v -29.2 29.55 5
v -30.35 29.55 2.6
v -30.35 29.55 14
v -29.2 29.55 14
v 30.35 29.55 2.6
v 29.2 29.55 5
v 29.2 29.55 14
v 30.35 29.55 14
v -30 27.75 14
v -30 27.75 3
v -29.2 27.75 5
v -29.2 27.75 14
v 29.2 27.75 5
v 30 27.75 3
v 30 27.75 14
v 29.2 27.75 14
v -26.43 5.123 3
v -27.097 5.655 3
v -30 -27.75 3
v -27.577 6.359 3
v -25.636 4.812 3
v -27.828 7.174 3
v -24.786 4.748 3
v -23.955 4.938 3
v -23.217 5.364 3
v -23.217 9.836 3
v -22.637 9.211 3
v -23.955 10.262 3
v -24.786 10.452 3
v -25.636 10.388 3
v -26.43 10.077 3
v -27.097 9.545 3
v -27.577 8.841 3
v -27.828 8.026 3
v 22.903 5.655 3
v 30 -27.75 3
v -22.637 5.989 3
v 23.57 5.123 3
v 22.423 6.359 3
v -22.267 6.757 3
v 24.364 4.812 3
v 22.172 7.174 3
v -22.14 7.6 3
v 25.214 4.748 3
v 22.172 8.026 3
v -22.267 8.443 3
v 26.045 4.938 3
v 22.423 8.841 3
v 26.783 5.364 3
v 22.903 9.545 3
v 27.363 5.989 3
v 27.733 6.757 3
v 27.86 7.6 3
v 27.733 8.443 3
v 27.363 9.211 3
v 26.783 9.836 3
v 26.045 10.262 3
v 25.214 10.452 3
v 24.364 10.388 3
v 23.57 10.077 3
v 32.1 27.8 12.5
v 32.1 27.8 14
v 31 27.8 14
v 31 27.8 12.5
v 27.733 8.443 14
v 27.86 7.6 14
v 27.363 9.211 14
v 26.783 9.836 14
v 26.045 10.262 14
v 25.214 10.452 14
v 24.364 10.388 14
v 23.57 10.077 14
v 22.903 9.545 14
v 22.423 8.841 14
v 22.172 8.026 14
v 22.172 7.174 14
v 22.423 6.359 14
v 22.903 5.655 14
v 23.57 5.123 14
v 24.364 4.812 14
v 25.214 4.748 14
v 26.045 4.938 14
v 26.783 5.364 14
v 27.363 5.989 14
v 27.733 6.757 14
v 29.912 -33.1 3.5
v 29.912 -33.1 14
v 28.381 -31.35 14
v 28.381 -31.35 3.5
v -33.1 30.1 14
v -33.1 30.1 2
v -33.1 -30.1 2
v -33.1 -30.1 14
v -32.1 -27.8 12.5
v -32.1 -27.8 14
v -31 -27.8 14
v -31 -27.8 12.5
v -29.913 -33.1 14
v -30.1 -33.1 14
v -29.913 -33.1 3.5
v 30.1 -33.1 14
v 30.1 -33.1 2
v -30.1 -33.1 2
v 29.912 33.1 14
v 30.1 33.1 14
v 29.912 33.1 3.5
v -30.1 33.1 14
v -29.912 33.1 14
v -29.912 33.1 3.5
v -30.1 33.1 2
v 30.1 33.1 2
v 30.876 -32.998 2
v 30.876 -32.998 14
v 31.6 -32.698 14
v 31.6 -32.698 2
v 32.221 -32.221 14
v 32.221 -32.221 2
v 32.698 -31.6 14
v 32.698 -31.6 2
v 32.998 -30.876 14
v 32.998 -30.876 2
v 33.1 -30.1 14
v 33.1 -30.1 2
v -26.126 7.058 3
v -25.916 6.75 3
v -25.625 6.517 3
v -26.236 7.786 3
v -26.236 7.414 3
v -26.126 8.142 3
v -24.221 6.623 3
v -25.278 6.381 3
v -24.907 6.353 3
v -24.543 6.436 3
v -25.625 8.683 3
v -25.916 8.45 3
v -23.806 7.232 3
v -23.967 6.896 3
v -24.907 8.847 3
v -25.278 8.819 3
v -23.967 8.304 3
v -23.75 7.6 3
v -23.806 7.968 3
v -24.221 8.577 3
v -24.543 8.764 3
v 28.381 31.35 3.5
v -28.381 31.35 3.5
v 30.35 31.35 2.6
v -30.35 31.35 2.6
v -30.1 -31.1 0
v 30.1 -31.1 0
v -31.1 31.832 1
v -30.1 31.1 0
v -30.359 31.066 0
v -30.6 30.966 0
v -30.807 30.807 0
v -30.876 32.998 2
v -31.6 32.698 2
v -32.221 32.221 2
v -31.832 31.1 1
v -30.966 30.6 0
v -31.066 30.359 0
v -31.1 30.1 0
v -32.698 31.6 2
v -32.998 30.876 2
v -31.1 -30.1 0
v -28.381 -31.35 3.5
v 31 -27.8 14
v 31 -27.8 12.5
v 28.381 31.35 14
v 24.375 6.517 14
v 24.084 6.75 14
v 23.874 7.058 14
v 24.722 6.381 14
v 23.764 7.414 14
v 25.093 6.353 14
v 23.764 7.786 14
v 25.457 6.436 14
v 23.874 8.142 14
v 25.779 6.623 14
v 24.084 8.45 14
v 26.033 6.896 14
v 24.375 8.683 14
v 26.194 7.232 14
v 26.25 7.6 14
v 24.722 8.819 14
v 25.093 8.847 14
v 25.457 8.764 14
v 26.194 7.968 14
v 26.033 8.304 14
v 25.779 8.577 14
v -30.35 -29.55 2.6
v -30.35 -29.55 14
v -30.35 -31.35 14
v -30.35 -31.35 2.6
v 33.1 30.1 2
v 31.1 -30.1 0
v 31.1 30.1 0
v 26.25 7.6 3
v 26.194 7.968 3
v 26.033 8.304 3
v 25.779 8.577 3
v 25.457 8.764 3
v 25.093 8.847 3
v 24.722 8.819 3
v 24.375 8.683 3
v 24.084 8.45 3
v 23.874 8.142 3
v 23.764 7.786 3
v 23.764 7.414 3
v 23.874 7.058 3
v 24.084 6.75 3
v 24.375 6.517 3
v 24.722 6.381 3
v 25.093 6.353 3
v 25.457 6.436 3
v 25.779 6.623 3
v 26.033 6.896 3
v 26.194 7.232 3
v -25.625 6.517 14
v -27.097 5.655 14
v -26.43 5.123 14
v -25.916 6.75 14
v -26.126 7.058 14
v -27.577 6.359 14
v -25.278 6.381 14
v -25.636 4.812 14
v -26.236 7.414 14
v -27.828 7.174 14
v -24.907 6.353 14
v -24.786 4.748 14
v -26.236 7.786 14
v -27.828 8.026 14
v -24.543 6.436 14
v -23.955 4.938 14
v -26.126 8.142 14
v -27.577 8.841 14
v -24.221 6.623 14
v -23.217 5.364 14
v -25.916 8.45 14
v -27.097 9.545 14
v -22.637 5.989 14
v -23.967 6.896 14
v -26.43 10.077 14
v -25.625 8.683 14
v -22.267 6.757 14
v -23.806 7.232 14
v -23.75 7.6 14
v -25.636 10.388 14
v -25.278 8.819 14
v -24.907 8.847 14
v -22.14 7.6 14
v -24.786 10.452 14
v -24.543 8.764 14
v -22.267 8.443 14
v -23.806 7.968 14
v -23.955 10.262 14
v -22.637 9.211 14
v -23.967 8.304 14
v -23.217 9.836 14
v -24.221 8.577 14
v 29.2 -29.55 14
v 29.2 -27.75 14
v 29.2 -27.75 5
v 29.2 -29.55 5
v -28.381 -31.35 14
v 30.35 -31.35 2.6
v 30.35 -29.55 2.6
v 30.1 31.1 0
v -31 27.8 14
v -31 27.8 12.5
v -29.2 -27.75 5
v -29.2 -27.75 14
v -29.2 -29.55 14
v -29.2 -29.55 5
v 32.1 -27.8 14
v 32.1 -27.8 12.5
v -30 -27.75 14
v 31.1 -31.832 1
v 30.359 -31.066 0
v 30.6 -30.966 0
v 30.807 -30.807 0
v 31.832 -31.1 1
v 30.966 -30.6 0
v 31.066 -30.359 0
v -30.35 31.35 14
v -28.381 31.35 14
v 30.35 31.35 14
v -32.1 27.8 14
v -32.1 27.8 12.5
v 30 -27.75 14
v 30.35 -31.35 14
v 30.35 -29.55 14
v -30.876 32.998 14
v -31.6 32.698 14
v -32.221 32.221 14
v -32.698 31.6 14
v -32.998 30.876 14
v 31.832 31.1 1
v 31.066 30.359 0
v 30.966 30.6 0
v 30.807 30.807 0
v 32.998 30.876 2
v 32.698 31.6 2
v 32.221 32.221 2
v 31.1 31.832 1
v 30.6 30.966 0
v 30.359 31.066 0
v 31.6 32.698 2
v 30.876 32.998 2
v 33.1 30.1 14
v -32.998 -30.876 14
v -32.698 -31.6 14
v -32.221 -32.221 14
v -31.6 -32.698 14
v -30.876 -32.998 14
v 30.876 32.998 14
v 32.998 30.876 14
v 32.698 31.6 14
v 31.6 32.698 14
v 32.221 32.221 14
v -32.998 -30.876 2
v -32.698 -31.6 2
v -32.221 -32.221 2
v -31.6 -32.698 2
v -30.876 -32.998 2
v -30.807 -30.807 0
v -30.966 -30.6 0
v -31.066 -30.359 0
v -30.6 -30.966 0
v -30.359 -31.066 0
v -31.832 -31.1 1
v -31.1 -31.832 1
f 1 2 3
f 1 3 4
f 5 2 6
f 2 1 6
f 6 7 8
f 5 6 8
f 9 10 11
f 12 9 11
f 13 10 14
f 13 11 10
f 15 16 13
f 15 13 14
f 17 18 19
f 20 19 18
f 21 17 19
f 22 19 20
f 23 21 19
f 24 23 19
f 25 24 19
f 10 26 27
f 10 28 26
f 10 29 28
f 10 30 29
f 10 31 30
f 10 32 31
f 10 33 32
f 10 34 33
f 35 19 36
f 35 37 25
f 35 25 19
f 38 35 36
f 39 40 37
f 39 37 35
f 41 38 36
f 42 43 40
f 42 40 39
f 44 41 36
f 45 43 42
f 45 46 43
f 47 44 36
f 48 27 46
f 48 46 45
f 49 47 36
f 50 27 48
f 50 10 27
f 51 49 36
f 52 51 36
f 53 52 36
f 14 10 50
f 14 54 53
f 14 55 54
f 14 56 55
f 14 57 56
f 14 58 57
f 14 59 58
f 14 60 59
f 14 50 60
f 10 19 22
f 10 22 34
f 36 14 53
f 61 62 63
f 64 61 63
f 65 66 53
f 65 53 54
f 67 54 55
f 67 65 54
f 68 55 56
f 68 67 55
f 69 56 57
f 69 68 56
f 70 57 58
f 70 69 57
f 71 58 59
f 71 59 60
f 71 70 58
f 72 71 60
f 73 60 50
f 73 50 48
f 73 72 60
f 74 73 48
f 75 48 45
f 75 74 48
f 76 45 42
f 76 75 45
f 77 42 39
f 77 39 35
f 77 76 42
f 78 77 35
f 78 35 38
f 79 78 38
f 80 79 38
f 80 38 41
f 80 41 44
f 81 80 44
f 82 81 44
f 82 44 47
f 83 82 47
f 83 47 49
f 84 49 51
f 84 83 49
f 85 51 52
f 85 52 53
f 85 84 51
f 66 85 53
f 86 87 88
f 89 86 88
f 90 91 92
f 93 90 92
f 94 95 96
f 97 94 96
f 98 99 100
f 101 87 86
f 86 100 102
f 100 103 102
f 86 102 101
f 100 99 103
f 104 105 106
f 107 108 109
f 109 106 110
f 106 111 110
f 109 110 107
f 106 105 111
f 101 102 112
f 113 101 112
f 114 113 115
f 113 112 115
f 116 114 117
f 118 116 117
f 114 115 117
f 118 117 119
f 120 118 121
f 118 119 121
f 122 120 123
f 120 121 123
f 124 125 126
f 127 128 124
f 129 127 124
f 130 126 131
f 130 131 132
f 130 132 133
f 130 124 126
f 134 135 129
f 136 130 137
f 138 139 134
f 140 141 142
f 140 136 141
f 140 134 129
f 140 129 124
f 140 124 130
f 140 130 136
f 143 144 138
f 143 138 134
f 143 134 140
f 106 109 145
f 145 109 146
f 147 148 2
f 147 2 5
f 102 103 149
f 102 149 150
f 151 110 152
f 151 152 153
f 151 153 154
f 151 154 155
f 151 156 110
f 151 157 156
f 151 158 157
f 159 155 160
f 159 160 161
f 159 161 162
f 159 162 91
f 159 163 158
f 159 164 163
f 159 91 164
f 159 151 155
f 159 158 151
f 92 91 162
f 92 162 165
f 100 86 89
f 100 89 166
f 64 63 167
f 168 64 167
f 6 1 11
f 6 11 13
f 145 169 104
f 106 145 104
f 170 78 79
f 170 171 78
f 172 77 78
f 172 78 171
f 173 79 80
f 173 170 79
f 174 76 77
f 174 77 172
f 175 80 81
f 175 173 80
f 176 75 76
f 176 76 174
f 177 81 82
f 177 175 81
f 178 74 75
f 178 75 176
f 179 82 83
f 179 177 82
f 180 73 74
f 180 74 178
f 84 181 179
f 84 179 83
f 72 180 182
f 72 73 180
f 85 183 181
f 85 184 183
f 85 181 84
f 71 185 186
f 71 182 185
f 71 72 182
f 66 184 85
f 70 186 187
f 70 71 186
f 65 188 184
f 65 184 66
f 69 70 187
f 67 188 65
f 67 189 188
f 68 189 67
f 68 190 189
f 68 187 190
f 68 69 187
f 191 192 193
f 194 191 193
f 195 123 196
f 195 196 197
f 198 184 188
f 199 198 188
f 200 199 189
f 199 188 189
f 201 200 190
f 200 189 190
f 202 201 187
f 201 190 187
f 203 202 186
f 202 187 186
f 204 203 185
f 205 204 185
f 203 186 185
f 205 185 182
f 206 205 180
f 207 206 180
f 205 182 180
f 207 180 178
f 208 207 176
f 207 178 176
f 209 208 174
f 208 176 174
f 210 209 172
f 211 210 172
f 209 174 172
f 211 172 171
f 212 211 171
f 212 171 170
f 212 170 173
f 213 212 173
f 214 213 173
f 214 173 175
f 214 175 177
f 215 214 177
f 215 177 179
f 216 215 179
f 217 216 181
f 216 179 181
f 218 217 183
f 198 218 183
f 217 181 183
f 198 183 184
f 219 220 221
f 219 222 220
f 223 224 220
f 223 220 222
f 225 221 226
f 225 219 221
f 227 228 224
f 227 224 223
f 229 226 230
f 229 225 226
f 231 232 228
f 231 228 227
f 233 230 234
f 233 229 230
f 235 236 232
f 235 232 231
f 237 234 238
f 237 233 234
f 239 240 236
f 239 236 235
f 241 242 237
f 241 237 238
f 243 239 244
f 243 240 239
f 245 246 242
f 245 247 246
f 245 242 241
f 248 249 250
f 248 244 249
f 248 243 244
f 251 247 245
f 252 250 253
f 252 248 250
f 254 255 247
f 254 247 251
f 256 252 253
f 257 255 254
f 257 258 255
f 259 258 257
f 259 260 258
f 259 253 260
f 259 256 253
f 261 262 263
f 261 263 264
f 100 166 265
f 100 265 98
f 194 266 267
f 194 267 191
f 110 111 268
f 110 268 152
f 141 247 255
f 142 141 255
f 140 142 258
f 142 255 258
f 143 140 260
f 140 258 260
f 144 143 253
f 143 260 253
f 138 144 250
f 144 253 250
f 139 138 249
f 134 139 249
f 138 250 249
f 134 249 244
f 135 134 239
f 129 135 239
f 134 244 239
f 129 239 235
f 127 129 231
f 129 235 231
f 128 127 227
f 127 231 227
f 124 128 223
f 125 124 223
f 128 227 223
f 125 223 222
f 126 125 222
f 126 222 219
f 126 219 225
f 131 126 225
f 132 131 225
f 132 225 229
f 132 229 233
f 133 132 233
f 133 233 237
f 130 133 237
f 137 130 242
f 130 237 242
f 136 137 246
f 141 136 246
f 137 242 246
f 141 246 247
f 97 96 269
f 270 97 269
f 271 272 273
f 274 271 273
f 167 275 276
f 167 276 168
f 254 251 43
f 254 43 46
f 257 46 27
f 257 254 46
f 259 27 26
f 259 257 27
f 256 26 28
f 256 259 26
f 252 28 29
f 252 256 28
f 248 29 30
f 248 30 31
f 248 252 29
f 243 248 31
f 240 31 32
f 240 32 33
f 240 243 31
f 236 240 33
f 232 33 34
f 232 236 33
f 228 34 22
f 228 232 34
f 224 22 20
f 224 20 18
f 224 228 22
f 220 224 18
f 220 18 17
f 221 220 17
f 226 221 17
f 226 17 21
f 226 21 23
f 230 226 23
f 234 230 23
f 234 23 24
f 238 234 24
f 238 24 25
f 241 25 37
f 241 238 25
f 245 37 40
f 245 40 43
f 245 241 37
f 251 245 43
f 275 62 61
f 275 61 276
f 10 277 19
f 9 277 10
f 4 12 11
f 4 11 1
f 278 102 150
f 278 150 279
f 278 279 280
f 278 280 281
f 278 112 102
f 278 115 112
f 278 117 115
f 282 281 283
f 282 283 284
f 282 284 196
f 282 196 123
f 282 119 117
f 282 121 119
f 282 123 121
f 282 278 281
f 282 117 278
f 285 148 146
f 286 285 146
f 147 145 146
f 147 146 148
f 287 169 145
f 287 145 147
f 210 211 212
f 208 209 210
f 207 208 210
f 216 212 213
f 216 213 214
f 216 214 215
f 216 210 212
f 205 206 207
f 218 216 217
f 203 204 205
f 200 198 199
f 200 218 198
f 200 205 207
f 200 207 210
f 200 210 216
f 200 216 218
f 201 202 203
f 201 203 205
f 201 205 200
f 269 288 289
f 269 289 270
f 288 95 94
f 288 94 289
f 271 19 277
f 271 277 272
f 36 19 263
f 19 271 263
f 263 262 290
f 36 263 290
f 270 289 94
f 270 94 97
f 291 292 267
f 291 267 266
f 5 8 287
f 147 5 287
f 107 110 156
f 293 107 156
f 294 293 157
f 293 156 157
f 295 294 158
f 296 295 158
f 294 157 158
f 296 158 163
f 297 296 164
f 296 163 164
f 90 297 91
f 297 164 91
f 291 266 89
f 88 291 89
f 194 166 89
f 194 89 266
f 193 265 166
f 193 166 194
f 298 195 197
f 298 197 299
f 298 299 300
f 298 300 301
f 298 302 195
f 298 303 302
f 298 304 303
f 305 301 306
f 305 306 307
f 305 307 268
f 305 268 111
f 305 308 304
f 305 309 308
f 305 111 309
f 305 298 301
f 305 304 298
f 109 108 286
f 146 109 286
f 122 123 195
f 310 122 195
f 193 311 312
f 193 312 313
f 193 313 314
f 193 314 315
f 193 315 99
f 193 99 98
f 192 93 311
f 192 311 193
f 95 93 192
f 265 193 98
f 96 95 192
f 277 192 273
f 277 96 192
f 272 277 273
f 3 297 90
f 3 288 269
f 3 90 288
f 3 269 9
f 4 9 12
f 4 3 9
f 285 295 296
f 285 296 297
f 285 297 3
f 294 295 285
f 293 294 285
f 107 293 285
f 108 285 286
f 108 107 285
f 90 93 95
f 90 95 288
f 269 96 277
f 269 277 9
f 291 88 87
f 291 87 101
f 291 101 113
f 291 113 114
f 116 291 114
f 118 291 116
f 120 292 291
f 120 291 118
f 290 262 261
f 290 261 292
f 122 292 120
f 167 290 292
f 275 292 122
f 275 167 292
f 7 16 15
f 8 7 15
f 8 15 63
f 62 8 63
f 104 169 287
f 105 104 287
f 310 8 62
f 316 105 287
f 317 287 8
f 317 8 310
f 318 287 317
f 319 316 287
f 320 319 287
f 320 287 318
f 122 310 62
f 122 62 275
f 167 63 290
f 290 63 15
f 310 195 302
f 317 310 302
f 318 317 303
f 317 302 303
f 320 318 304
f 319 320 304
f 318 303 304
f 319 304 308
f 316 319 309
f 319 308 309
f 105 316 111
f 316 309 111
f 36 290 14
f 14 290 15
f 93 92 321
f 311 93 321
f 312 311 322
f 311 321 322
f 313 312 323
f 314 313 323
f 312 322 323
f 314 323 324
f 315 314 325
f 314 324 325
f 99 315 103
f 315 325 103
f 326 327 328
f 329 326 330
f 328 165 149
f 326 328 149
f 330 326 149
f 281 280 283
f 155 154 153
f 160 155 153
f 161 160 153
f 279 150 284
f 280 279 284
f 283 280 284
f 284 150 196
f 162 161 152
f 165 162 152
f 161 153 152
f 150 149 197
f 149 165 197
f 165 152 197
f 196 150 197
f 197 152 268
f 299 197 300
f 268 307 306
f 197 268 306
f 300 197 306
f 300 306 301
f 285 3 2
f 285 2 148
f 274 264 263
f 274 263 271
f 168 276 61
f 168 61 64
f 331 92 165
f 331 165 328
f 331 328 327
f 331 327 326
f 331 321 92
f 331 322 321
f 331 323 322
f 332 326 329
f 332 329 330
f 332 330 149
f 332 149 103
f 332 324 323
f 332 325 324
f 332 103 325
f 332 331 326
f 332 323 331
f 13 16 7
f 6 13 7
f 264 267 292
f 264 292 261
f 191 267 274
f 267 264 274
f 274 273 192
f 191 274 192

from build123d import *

# Parameters (mm, degrees)
PAD_DEPTH             = 14
SKETCH001_W           = 60
SKETCH001_H           = 55.5
POCKET_DEPTH          = 11
SKETCH002_W           = 60.7
SKETCH002_H           = 1.8
POCKET001_DEPTH       = 11.4
POLARPATTERN_COUNT    = 2
SKETCH003_W           = 58.4
SKETCH003_H           = 2
POCKET002_DEPTH       = 9
POLARPATTERN001_COUNT = 2
POCKET003_DEPTH       = 10.5
POLARPATTERN002_COUNT = 2
SKETCH005_W           = 1.1
SKETCH005_H           = 55.6
POCKET004_DEPTH       = 1.5
POLARPATTERN003_COUNT = 2
SKETCH006_R           = 2.86
SKETCH006_R_2         = 1.25
PAD001_DEPTH          = 11
CHAMFER_SIZE          = 2


with BuildPart() as part:
    # Sketch → Pad (new body)
    with BuildSketch(Plane.XY):
        with BuildLine():
            Line((-33.1, 30.1), (-33.1, -30.1))
            ThreePointArc((-33.1, -30.1), (-32.22132, -32.22132), (-30.1, -33.1))
            Line((-30.1, -33.1), (30.1, -33.1))
            ThreePointArc((30.1, -33.1), (32.22132, -32.22132), (33.1, -30.1))
            Line((33.1, -30.1), (33.1, 30.1))
            ThreePointArc((33.1, 30.1), (32.22132, 32.22132), (30.1, 33.1))
            Line((30.1, 33.1), (-30.1, 33.1))
            ThreePointArc((-30.1, 33.1), (-32.22132, 32.22132), (-33.1, 30.1))
        make_face()
    extrude(amount=PAD_DEPTH)

    # Sketch001 (on DatumPlane) → Pocket (cut)
    with BuildSketch(Plane.XY.offset(14)):
        Rectangle(SKETCH001_W, SKETCH001_H)
    extrude(amount=-POCKET_DEPTH, mode=Mode.SUBTRACT)

    # Sketch002 (on DatumPlane) → Pocket001 (cut)
    with BuildSketch(Plane.XY.offset(14)):
        with Locations((0, 30.45)):
            Rectangle(SKETCH002_W, SKETCH002_H)
    pocket001 = extrude(amount=-POCKET001_DEPTH, mode=Mode.SUBTRACT)

    # PolarPattern: Pocket001 ×2 about axis
    polarpattern_axis = Axis((0, 0, 14), (0, 0, 1))
    for i in range(1, POLARPATTERN_COUNT):
        add(pocket001.rotate(polarpattern_axis, i * 360 / POLARPATTERN_COUNT), mode=Mode.SUBTRACT)

    # Sketch003 (on DatumPlane) → Pocket002 (cut)
    with BuildSketch(Plane.XY.offset(14)):
        with Locations((0, 28.7)):
            Rectangle(SKETCH003_W, SKETCH003_H)
    pocket002 = extrude(amount=-POCKET002_DEPTH, mode=Mode.SUBTRACT)

    # PolarPattern001: Pocket002 ×2 about axis
    polarpattern001_axis = Axis((0, 0, 14), (0, 0, 1))
    for i in range(1, POLARPATTERN001_COUNT):
        add(pocket002.rotate(polarpattern001_axis, i * 360 / POLARPATTERN001_COUNT), mode=Mode.SUBTRACT)

    # Sketch004 (on DatumPlane) → Pocket003 (cut)
    with BuildSketch(Plane.XY.offset(14)):
        Polygon((-28.25, 31.2), (28.25, 31.2), (30, 33.2), (-30, 33.2), align=None)
    pocket003 = extrude(amount=-POCKET003_DEPTH, mode=Mode.SUBTRACT)

    # PolarPattern002: Pocket003 ×2 about axis
    polarpattern002_axis = Axis((0, 0, 14), (0, 0, 1))
    for i in range(1, POLARPATTERN002_COUNT):
        add(pocket003.rotate(polarpattern002_axis, i * 360 / POLARPATTERN002_COUNT), mode=Mode.SUBTRACT)

    # Sketch005 (on DatumPlane) → Pocket004 (cut)
    with BuildSketch(Plane.XY.offset(14)):
        with Locations((-31.55, 0)):
            Rectangle(SKETCH005_W, SKETCH005_H)
    pocket004 = extrude(amount=-POCKET004_DEPTH, mode=Mode.SUBTRACT)

    # PolarPattern003: Pocket004 ×2 about axis
    polarpattern003_axis = Axis((0, 0, 14), (0, 0, 1))
    for i in range(1, POLARPATTERN003_COUNT):
        add(pocket004.rotate(polarpattern003_axis, i * 360 / POLARPATTERN003_COUNT), mode=Mode.SUBTRACT)

    # Sketch006 (on DatumPlane) → Pad001 (join)
    with BuildSketch(Plane.XY.offset(14)):
        with Locations((-25, 7.6)):
            Circle(SKETCH006_R)
        with Locations((-25, 7.6)):
            Circle(SKETCH006_R_2, mode=Mode.SUBTRACT)
        with Locations((25, 7.6)):
            Circle(SKETCH006_R)
        with Locations((25, 7.6)):
            Circle(SKETCH006_R_2, mode=Mode.SUBTRACT)
    extrude(amount=-PAD001_DEPTH)

    # Chamfer
    chamfer_edges = [part.edges().sort_by_distance(p)[0] for p in [
        (0, -33.1, 0),
    ]]
    chamfer(chamfer_edges, length=CHAMFER_SIZE)


solid = part.part
